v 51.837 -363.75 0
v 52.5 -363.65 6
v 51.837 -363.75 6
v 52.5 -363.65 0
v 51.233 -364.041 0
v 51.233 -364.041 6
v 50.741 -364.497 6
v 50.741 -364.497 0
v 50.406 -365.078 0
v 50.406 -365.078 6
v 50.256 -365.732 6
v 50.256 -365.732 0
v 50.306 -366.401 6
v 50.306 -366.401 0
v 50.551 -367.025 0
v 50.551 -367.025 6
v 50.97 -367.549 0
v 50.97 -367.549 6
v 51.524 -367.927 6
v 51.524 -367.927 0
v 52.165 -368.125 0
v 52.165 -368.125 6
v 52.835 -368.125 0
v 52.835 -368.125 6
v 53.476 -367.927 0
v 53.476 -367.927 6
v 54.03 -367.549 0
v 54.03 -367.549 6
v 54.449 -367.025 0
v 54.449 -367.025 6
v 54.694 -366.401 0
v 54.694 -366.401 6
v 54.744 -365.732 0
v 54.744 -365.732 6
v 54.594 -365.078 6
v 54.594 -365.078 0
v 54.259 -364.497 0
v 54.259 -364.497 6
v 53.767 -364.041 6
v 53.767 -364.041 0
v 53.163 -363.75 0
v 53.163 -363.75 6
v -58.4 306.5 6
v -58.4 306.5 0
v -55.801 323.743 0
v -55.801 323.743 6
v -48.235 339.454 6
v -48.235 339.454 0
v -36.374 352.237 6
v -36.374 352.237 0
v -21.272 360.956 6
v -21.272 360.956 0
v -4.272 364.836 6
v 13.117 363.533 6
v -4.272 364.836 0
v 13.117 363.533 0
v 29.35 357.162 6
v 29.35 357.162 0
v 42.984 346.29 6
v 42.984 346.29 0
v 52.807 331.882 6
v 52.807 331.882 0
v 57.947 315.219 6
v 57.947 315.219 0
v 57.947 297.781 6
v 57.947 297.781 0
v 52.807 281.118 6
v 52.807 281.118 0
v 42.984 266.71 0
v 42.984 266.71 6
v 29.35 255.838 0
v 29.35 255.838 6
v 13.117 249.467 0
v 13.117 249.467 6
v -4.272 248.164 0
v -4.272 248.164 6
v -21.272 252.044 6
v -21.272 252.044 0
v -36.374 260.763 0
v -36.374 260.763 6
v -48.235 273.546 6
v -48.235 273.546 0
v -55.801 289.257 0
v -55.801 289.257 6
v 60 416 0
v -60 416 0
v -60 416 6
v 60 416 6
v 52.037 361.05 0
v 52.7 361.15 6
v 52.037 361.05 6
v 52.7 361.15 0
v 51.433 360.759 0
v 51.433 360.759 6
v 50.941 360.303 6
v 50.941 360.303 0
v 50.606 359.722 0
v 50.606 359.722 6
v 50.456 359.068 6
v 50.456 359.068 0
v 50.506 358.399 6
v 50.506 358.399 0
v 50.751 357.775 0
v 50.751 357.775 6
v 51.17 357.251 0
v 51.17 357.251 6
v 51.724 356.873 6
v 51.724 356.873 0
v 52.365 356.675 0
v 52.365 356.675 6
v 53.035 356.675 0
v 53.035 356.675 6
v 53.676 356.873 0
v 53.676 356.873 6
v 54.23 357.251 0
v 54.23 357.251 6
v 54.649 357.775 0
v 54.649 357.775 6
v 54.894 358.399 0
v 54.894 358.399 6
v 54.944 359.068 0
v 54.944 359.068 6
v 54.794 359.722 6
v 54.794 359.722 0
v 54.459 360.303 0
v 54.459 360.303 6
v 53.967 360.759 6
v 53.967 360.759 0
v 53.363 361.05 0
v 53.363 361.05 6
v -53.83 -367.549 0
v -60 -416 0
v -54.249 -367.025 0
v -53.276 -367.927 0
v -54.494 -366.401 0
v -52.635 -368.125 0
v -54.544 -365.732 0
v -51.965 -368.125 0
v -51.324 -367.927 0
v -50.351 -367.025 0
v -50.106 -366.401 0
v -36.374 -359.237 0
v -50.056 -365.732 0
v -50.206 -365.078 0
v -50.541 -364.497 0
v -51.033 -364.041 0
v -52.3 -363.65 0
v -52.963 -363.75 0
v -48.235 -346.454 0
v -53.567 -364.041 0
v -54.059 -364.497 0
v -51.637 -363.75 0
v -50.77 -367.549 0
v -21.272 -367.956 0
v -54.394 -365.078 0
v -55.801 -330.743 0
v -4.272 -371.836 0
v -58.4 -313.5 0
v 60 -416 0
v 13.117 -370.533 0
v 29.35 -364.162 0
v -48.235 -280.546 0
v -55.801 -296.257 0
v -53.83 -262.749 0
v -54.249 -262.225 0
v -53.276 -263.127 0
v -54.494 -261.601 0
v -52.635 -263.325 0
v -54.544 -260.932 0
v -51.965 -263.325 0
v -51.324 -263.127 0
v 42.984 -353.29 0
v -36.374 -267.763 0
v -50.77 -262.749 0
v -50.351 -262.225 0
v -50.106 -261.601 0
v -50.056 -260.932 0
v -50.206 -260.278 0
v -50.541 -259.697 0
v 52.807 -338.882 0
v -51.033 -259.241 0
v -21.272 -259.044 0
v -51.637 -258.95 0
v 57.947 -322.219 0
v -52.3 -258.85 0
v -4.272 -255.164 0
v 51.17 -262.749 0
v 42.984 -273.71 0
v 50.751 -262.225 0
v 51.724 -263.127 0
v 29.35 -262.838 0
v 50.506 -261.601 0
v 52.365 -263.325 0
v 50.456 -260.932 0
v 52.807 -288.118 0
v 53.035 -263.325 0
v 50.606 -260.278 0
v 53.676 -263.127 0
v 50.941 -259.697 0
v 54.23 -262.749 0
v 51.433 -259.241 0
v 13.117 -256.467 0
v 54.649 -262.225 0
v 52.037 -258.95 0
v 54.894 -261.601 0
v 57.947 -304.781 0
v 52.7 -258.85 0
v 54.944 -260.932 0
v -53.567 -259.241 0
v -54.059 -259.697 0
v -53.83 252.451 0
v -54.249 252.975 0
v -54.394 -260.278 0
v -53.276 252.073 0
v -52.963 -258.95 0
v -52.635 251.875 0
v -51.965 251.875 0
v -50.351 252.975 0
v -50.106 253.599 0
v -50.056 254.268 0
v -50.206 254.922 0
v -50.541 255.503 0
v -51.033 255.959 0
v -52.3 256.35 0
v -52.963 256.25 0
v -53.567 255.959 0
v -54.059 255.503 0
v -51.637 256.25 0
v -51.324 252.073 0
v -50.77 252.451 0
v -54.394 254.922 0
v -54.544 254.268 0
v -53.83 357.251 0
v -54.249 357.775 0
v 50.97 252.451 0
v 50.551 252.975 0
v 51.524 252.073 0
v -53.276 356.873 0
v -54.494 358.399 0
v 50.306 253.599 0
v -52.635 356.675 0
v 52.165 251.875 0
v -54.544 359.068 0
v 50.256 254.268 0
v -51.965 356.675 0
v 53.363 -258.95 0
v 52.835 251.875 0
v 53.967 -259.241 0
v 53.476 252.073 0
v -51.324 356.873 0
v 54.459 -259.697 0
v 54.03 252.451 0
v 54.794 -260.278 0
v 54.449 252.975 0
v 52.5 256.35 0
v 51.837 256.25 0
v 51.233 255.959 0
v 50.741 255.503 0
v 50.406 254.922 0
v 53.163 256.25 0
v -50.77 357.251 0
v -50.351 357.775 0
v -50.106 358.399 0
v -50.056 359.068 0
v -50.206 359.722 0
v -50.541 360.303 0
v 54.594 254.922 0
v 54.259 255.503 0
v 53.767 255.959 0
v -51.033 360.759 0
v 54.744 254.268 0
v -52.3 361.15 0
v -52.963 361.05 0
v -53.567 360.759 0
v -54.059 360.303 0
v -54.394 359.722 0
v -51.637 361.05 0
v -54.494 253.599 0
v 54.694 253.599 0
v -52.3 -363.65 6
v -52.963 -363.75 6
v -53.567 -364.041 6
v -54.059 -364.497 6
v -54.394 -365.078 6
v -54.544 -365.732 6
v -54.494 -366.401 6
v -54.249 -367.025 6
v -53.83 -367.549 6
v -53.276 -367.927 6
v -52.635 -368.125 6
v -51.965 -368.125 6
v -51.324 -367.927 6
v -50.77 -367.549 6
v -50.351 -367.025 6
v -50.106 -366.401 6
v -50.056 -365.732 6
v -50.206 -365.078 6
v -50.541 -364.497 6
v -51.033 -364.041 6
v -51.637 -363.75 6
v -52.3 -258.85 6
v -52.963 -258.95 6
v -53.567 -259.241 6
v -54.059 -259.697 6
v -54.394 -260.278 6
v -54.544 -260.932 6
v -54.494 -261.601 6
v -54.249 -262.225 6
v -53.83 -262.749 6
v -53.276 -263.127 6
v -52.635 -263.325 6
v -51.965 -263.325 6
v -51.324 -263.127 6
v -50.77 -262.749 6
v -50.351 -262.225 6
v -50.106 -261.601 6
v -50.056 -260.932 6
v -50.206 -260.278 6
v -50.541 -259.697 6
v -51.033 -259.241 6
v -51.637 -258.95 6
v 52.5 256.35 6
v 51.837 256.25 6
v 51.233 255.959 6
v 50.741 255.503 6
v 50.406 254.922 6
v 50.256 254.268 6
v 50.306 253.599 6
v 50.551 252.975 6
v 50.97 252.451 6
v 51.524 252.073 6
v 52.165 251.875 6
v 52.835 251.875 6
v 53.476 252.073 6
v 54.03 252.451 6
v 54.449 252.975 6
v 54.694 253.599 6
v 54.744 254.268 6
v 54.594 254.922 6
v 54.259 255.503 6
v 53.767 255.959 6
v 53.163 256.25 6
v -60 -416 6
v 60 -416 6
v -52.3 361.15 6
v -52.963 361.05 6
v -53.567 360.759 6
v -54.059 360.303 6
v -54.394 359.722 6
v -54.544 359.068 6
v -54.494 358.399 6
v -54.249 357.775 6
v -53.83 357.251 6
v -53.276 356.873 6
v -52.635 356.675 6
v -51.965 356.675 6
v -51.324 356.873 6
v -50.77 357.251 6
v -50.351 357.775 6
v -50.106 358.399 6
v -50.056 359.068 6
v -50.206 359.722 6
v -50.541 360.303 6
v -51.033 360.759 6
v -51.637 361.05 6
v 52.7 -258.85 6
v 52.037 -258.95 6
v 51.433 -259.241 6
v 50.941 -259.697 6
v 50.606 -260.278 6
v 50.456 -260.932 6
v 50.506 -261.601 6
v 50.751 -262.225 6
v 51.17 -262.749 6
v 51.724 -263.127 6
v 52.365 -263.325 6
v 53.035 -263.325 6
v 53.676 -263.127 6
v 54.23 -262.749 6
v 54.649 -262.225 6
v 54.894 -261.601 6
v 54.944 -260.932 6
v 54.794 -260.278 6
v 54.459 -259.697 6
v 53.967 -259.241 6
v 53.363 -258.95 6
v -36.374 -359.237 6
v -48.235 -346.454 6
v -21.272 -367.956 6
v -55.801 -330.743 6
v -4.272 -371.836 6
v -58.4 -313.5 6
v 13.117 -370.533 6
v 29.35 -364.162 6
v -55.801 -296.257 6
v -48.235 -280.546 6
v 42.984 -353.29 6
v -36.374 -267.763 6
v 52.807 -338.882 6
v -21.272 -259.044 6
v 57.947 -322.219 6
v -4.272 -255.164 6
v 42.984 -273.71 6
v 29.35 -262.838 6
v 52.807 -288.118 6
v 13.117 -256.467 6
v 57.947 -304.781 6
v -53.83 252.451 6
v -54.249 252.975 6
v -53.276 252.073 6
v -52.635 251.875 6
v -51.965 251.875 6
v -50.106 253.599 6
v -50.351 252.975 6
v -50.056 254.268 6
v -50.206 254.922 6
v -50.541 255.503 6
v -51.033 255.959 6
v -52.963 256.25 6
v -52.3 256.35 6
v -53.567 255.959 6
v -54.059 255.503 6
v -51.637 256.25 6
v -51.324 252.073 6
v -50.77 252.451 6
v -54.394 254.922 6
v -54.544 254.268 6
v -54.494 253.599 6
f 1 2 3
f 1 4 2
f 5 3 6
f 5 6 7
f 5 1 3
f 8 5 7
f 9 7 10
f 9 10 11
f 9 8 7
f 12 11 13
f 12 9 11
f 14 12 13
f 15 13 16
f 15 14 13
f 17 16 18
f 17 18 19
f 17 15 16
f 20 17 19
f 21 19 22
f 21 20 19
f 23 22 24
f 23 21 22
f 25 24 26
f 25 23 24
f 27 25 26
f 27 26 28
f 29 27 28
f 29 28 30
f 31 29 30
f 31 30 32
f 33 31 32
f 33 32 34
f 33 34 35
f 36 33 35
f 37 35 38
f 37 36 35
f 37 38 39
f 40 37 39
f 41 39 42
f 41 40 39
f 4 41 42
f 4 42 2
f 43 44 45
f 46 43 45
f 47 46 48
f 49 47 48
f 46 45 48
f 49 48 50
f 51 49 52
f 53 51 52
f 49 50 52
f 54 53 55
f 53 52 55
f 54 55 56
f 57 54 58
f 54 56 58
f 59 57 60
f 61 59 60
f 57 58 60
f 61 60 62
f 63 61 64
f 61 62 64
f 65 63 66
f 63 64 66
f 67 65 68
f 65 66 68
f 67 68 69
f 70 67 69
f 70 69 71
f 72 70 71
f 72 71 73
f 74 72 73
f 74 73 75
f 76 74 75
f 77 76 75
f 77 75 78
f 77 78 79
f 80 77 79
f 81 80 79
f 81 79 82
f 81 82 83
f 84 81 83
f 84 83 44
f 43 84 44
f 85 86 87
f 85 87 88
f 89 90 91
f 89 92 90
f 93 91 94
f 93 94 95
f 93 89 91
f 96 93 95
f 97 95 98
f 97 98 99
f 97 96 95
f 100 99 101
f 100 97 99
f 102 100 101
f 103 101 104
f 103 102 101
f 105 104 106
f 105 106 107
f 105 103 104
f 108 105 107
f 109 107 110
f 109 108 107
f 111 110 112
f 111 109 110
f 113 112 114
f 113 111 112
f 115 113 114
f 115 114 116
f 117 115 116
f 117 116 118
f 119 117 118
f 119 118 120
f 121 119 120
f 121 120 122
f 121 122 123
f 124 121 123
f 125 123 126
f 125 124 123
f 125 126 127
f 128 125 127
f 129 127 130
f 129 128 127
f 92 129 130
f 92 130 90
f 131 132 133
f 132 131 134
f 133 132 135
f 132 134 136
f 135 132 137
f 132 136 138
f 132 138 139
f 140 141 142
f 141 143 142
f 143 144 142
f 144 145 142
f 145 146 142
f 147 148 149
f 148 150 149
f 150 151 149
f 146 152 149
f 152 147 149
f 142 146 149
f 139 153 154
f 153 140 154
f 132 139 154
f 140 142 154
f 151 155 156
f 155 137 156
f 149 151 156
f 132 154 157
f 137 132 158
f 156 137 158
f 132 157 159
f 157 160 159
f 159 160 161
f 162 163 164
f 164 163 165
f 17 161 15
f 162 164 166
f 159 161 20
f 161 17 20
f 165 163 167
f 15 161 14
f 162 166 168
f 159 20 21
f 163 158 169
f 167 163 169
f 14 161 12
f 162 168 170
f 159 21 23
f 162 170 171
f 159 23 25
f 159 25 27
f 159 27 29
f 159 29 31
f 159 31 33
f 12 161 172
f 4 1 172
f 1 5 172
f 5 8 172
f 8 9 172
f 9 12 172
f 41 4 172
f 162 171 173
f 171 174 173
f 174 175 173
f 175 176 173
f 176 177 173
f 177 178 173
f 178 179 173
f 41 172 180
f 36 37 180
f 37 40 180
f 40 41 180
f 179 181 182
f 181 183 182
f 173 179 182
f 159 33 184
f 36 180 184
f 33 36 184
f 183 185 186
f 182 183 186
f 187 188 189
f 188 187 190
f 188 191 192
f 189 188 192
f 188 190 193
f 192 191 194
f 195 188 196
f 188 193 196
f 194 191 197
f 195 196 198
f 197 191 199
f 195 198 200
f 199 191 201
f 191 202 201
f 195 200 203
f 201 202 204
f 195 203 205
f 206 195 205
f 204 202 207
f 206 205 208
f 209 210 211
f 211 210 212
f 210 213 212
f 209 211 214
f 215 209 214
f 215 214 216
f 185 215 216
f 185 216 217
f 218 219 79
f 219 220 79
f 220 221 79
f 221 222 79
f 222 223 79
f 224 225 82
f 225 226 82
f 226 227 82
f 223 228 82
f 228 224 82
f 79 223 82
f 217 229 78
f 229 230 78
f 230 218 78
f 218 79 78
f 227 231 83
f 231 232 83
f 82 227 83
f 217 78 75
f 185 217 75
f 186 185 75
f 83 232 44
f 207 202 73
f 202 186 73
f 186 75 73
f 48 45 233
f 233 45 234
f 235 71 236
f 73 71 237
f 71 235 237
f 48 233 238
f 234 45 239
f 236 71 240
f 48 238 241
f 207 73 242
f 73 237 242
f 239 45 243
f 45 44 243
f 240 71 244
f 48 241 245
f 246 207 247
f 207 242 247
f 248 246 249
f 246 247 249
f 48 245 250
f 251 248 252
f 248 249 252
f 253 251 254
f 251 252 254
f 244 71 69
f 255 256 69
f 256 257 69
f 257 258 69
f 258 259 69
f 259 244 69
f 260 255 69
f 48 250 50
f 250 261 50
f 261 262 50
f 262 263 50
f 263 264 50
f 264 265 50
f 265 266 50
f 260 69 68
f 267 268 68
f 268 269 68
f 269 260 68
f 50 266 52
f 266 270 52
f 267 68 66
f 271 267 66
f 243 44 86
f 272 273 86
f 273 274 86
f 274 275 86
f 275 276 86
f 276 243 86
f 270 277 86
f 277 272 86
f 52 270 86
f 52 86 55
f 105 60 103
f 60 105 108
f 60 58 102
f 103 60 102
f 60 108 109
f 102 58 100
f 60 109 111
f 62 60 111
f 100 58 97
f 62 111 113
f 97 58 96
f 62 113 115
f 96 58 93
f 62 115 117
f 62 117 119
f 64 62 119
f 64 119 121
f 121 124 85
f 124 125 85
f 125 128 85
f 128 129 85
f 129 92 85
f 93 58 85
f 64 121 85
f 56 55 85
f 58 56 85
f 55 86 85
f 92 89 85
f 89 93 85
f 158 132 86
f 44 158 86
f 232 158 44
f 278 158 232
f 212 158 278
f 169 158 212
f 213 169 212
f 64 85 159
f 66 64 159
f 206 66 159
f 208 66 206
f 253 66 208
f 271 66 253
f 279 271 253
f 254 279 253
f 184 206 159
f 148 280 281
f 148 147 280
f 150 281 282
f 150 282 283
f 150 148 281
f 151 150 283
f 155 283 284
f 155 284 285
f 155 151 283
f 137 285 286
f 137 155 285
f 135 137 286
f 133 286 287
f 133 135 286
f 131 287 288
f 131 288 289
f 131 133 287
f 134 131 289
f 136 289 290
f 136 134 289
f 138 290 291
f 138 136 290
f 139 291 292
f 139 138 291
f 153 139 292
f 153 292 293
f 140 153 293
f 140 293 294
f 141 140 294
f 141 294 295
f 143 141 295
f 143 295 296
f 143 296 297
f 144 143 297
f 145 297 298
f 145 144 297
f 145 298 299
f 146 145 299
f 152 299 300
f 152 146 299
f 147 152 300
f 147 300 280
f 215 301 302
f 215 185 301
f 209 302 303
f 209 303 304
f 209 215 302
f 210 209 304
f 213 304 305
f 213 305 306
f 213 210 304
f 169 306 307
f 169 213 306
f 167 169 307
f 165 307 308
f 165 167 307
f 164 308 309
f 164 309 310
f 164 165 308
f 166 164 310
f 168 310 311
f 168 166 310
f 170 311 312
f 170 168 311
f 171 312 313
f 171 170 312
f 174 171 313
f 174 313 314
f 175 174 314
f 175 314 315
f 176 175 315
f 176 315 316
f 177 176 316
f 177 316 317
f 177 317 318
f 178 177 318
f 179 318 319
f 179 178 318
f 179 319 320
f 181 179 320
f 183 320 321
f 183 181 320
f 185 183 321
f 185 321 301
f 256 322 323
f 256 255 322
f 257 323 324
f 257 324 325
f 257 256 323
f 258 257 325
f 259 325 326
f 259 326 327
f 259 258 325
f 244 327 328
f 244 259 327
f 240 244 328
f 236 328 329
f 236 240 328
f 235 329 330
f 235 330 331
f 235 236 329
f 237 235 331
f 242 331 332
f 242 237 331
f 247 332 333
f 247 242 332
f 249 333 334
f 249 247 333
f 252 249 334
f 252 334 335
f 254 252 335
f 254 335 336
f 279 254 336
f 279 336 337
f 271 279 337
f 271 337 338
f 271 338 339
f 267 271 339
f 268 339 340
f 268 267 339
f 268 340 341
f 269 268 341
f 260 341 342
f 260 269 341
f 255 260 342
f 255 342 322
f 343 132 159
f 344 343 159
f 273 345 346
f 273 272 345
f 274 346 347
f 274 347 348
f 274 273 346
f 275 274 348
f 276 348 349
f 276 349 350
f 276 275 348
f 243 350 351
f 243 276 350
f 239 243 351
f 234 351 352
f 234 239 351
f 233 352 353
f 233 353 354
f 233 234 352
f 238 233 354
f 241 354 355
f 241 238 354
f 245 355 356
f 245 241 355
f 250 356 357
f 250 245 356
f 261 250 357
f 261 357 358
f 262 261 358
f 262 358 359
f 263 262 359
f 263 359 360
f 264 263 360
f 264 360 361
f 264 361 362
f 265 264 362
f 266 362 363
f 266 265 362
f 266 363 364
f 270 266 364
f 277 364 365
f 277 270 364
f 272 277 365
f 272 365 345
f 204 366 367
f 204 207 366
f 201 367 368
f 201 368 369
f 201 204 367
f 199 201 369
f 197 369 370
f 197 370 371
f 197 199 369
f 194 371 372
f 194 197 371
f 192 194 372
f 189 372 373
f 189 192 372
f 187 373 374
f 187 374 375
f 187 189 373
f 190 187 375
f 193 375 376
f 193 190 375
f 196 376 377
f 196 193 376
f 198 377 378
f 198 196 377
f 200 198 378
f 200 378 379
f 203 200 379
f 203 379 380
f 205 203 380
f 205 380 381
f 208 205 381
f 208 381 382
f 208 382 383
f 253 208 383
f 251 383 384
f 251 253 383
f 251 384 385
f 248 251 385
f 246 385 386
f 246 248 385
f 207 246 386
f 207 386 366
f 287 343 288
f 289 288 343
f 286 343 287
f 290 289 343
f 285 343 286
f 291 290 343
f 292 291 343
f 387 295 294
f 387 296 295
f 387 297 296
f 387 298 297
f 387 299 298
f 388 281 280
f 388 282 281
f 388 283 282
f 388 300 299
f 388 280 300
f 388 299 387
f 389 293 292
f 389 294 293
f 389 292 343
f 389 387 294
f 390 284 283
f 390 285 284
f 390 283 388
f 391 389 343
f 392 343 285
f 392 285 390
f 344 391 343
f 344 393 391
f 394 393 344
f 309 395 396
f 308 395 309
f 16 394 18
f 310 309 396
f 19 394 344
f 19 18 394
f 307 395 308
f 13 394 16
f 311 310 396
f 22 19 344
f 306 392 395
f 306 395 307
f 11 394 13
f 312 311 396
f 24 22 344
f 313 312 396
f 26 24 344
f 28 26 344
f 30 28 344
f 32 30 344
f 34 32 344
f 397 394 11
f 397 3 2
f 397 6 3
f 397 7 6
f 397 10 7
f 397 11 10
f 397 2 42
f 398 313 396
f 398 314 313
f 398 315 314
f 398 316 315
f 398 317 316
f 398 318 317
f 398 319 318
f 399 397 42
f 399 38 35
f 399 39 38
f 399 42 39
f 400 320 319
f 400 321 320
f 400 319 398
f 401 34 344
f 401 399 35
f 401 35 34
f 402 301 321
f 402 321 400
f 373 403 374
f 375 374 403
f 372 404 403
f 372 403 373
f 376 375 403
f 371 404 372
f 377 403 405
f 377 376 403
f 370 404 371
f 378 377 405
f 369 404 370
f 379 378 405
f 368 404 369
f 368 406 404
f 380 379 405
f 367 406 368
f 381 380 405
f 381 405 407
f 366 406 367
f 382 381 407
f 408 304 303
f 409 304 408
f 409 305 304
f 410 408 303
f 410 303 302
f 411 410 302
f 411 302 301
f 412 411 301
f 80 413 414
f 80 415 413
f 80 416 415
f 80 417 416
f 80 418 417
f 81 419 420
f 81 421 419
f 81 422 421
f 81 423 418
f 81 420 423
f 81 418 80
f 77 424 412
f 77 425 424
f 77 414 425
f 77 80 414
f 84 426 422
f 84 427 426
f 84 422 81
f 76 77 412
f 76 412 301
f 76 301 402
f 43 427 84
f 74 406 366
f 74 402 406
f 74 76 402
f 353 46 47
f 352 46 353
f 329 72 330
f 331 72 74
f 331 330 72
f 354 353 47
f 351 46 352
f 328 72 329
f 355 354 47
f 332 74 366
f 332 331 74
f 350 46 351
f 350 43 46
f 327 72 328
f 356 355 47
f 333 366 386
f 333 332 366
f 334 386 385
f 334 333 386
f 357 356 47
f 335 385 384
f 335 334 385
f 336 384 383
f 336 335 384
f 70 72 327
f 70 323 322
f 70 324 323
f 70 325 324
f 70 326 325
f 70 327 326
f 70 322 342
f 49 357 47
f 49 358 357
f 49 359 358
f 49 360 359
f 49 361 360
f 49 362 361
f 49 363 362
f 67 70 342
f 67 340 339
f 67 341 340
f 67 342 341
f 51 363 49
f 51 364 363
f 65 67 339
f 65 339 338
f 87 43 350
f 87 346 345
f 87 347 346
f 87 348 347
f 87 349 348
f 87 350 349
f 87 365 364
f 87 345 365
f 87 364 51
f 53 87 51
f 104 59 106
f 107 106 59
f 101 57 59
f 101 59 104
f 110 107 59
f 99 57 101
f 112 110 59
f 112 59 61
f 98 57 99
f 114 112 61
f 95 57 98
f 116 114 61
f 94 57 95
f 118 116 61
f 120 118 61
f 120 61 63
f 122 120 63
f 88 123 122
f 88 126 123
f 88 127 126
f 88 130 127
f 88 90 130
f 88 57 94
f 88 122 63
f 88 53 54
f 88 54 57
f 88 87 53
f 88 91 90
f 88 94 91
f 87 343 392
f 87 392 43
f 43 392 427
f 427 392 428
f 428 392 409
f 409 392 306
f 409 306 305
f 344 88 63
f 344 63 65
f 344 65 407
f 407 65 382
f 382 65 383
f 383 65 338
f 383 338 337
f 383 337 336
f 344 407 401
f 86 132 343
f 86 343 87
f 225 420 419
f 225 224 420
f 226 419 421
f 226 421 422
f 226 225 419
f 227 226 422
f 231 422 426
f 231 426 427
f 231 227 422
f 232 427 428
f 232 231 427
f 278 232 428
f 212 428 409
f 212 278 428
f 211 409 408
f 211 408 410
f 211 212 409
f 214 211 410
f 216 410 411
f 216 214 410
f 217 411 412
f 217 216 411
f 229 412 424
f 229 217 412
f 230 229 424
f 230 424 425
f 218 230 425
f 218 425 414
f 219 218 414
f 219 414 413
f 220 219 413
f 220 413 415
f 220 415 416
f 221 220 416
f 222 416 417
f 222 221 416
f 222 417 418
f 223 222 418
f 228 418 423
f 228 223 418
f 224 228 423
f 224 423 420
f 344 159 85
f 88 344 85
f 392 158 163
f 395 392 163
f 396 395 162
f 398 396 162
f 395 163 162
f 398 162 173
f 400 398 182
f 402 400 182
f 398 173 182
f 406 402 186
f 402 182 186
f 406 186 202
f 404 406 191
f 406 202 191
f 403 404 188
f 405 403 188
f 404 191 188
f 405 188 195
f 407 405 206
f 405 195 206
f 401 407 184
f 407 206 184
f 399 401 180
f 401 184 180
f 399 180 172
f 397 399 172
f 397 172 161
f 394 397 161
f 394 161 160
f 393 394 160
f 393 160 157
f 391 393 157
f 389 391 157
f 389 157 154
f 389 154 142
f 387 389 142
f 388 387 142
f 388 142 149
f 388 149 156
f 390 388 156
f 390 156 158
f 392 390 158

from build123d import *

# Parameters (mm, degrees)
ESQUISSE1_W                   = 120
ESQUISSE1_H                   = 832
BOSS_EXTRU_1_DEPTH            = 6
SKETCH1_R                     = 58.5
CUT_EXTRUDE1_DEPTH            = 10
LPATTERN1_COUNT               = 2
LPATTERN1_PITCH               = 620
M4_CLEARANCE_HOLE1_AT_2_COUNT = 2
M4_CLEARANCE_HOLE1_AT_2_PITCH = 104.8
M4_CLEARANCE_HOLE1_AT_3_COUNT = 2
M4_CLEARANCE_HOLE1_AT_3_PITCH = 148.351070101
M4_CLEARANCE_HOLE1_AT_4_COUNT = 2
M4_CLEARANCE_HOLE1_AT_4_PITCH = 104.8
LPATTERN2_COUNT               = 2
LPATTERN2_PITCH               = 620


with BuildPart() as part:
    # Esquisse1 → Boss.-Extru.1 (new body)
    with BuildSketch(Plane.XY):
        Rectangle(ESQUISSE1_W, ESQUISSE1_H)
    extrude(amount=BOSS_EXTRU_1_DEPTH)

    # Sketch1 → Cut-Extrude1 (cut)
    with BuildSketch(Plane(origin=(0, 0, 0), x_dir=(-1, 0, 0), z_dir=(0, 0, -1))):
        with Locations((-0.1, 306.5)):
            Circle(SKETCH1_R)
    cut_extrude1 = extrude(amount=-CUT_EXTRUDE1_DEPTH, mode=Mode.SUBTRACT)

    # LPattern1: Cut-Extrude1 ×2
    with Locations(*[(0, -i * LPATTERN1_PITCH, 0) for i in range(1, LPATTERN1_COUNT)]):
        add(cut_extrude1, mode=Mode.SUBTRACT)

    # Sketch2 → M4 Clearance Hole1 (revolve, cut)
    with BuildSketch(Plane(origin=(-52.3, 254.1, 0), x_dir=(0, 1, 0), z_dir=(1, 0, 0))):
        Polygon((0, 0), (0, 7.351936393), (2.25, 6), (2.25, 0), align=None)
    m4_clearance_hole1 = revolve(axis=Axis((-52.3, 254.1, -6.35), (0, 0, 1)), mode=Mode.SUBTRACT)

    # M4 Clearance Hole1 at 2: M4 Clearance Hole1 ×2
    with Locations(*[(0, i * M4_CLEARANCE_HOLE1_AT_2_PITCH, 0) for i in range(1, M4_CLEARANCE_HOLE1_AT_2_COUNT)]):
        add(m4_clearance_hole1, mode=Mode.SUBTRACT)

    # M4 Clearance Hole1 at 3: M4 Clearance Hole1 ×2
    with Locations(*[Vector(0.7077805365932406, 0.7064323831901992, 0) * (i * M4_CLEARANCE_HOLE1_AT_3_PITCH) for i in range(1, M4_CLEARANCE_HOLE1_AT_3_COUNT)]):
        add(m4_clearance_hole1, mode=Mode.SUBTRACT)

    # M4 Clearance Hole1 at 4: M4 Clearance Hole1 ×2
    with Locations(*[(i * M4_CLEARANCE_HOLE1_AT_4_PITCH, 0, 0) for i in range(1, M4_CLEARANCE_HOLE1_AT_4_COUNT)]):
        add(m4_clearance_hole1, mode=Mode.SUBTRACT)

    # LPattern2: M4 Clearance Hole1 ×2
    with Locations(*[(0, -i * LPATTERN2_PITCH, 0) for i in range(1, LPATTERN2_COUNT)]):
        add(m4_clearance_hole1, mode=Mode.SUBTRACT)

    # LPattern2 copy 1 sketch → LPattern2 copy 1 (revolve, cut)
    with BuildSketch(Plane(origin=(-52.3, -261.1, 0), x_dir=(0, 1, 0), z_dir=(1, 0, 0))):
        Polygon((0, 0), (0, 7.351936393), (2.25, 6), (2.25, 0), align=None)
    revolve(axis=Axis((-52.3, -261.1, -6.35), (0, 0, 1)), mode=Mode.SUBTRACT)

    # LPattern2 copy 2 sketch → LPattern2 copy 2 (revolve, cut)
    with BuildSketch(Plane(origin=(52.7, -261.1, 0), x_dir=(0, 1, 0), z_dir=(1, 0, 0))):
        Polygon((0, 0), (0, 7.351936393), (2.25, 6), (2.25, 0), align=None)
    revolve(axis=Axis((52.7, -261.1, -6.35), (0, 0, 1)), mode=Mode.SUBTRACT)

    # LPattern2 copy 3 sketch → LPattern2 copy 3 (revolve, cut)
    with BuildSketch(Plane(origin=(52.5, -365.9, 0), x_dir=(0, 1, 0), z_dir=(1, 0, 0))):
        Polygon((0, 0), (0, 7.351936393), (2.25, 6), (2.25, 0), align=None)
    revolve(axis=Axis((52.5, -365.9, -6.35), (0, 0, 1)), mode=Mode.SUBTRACT)


solid = part.part
